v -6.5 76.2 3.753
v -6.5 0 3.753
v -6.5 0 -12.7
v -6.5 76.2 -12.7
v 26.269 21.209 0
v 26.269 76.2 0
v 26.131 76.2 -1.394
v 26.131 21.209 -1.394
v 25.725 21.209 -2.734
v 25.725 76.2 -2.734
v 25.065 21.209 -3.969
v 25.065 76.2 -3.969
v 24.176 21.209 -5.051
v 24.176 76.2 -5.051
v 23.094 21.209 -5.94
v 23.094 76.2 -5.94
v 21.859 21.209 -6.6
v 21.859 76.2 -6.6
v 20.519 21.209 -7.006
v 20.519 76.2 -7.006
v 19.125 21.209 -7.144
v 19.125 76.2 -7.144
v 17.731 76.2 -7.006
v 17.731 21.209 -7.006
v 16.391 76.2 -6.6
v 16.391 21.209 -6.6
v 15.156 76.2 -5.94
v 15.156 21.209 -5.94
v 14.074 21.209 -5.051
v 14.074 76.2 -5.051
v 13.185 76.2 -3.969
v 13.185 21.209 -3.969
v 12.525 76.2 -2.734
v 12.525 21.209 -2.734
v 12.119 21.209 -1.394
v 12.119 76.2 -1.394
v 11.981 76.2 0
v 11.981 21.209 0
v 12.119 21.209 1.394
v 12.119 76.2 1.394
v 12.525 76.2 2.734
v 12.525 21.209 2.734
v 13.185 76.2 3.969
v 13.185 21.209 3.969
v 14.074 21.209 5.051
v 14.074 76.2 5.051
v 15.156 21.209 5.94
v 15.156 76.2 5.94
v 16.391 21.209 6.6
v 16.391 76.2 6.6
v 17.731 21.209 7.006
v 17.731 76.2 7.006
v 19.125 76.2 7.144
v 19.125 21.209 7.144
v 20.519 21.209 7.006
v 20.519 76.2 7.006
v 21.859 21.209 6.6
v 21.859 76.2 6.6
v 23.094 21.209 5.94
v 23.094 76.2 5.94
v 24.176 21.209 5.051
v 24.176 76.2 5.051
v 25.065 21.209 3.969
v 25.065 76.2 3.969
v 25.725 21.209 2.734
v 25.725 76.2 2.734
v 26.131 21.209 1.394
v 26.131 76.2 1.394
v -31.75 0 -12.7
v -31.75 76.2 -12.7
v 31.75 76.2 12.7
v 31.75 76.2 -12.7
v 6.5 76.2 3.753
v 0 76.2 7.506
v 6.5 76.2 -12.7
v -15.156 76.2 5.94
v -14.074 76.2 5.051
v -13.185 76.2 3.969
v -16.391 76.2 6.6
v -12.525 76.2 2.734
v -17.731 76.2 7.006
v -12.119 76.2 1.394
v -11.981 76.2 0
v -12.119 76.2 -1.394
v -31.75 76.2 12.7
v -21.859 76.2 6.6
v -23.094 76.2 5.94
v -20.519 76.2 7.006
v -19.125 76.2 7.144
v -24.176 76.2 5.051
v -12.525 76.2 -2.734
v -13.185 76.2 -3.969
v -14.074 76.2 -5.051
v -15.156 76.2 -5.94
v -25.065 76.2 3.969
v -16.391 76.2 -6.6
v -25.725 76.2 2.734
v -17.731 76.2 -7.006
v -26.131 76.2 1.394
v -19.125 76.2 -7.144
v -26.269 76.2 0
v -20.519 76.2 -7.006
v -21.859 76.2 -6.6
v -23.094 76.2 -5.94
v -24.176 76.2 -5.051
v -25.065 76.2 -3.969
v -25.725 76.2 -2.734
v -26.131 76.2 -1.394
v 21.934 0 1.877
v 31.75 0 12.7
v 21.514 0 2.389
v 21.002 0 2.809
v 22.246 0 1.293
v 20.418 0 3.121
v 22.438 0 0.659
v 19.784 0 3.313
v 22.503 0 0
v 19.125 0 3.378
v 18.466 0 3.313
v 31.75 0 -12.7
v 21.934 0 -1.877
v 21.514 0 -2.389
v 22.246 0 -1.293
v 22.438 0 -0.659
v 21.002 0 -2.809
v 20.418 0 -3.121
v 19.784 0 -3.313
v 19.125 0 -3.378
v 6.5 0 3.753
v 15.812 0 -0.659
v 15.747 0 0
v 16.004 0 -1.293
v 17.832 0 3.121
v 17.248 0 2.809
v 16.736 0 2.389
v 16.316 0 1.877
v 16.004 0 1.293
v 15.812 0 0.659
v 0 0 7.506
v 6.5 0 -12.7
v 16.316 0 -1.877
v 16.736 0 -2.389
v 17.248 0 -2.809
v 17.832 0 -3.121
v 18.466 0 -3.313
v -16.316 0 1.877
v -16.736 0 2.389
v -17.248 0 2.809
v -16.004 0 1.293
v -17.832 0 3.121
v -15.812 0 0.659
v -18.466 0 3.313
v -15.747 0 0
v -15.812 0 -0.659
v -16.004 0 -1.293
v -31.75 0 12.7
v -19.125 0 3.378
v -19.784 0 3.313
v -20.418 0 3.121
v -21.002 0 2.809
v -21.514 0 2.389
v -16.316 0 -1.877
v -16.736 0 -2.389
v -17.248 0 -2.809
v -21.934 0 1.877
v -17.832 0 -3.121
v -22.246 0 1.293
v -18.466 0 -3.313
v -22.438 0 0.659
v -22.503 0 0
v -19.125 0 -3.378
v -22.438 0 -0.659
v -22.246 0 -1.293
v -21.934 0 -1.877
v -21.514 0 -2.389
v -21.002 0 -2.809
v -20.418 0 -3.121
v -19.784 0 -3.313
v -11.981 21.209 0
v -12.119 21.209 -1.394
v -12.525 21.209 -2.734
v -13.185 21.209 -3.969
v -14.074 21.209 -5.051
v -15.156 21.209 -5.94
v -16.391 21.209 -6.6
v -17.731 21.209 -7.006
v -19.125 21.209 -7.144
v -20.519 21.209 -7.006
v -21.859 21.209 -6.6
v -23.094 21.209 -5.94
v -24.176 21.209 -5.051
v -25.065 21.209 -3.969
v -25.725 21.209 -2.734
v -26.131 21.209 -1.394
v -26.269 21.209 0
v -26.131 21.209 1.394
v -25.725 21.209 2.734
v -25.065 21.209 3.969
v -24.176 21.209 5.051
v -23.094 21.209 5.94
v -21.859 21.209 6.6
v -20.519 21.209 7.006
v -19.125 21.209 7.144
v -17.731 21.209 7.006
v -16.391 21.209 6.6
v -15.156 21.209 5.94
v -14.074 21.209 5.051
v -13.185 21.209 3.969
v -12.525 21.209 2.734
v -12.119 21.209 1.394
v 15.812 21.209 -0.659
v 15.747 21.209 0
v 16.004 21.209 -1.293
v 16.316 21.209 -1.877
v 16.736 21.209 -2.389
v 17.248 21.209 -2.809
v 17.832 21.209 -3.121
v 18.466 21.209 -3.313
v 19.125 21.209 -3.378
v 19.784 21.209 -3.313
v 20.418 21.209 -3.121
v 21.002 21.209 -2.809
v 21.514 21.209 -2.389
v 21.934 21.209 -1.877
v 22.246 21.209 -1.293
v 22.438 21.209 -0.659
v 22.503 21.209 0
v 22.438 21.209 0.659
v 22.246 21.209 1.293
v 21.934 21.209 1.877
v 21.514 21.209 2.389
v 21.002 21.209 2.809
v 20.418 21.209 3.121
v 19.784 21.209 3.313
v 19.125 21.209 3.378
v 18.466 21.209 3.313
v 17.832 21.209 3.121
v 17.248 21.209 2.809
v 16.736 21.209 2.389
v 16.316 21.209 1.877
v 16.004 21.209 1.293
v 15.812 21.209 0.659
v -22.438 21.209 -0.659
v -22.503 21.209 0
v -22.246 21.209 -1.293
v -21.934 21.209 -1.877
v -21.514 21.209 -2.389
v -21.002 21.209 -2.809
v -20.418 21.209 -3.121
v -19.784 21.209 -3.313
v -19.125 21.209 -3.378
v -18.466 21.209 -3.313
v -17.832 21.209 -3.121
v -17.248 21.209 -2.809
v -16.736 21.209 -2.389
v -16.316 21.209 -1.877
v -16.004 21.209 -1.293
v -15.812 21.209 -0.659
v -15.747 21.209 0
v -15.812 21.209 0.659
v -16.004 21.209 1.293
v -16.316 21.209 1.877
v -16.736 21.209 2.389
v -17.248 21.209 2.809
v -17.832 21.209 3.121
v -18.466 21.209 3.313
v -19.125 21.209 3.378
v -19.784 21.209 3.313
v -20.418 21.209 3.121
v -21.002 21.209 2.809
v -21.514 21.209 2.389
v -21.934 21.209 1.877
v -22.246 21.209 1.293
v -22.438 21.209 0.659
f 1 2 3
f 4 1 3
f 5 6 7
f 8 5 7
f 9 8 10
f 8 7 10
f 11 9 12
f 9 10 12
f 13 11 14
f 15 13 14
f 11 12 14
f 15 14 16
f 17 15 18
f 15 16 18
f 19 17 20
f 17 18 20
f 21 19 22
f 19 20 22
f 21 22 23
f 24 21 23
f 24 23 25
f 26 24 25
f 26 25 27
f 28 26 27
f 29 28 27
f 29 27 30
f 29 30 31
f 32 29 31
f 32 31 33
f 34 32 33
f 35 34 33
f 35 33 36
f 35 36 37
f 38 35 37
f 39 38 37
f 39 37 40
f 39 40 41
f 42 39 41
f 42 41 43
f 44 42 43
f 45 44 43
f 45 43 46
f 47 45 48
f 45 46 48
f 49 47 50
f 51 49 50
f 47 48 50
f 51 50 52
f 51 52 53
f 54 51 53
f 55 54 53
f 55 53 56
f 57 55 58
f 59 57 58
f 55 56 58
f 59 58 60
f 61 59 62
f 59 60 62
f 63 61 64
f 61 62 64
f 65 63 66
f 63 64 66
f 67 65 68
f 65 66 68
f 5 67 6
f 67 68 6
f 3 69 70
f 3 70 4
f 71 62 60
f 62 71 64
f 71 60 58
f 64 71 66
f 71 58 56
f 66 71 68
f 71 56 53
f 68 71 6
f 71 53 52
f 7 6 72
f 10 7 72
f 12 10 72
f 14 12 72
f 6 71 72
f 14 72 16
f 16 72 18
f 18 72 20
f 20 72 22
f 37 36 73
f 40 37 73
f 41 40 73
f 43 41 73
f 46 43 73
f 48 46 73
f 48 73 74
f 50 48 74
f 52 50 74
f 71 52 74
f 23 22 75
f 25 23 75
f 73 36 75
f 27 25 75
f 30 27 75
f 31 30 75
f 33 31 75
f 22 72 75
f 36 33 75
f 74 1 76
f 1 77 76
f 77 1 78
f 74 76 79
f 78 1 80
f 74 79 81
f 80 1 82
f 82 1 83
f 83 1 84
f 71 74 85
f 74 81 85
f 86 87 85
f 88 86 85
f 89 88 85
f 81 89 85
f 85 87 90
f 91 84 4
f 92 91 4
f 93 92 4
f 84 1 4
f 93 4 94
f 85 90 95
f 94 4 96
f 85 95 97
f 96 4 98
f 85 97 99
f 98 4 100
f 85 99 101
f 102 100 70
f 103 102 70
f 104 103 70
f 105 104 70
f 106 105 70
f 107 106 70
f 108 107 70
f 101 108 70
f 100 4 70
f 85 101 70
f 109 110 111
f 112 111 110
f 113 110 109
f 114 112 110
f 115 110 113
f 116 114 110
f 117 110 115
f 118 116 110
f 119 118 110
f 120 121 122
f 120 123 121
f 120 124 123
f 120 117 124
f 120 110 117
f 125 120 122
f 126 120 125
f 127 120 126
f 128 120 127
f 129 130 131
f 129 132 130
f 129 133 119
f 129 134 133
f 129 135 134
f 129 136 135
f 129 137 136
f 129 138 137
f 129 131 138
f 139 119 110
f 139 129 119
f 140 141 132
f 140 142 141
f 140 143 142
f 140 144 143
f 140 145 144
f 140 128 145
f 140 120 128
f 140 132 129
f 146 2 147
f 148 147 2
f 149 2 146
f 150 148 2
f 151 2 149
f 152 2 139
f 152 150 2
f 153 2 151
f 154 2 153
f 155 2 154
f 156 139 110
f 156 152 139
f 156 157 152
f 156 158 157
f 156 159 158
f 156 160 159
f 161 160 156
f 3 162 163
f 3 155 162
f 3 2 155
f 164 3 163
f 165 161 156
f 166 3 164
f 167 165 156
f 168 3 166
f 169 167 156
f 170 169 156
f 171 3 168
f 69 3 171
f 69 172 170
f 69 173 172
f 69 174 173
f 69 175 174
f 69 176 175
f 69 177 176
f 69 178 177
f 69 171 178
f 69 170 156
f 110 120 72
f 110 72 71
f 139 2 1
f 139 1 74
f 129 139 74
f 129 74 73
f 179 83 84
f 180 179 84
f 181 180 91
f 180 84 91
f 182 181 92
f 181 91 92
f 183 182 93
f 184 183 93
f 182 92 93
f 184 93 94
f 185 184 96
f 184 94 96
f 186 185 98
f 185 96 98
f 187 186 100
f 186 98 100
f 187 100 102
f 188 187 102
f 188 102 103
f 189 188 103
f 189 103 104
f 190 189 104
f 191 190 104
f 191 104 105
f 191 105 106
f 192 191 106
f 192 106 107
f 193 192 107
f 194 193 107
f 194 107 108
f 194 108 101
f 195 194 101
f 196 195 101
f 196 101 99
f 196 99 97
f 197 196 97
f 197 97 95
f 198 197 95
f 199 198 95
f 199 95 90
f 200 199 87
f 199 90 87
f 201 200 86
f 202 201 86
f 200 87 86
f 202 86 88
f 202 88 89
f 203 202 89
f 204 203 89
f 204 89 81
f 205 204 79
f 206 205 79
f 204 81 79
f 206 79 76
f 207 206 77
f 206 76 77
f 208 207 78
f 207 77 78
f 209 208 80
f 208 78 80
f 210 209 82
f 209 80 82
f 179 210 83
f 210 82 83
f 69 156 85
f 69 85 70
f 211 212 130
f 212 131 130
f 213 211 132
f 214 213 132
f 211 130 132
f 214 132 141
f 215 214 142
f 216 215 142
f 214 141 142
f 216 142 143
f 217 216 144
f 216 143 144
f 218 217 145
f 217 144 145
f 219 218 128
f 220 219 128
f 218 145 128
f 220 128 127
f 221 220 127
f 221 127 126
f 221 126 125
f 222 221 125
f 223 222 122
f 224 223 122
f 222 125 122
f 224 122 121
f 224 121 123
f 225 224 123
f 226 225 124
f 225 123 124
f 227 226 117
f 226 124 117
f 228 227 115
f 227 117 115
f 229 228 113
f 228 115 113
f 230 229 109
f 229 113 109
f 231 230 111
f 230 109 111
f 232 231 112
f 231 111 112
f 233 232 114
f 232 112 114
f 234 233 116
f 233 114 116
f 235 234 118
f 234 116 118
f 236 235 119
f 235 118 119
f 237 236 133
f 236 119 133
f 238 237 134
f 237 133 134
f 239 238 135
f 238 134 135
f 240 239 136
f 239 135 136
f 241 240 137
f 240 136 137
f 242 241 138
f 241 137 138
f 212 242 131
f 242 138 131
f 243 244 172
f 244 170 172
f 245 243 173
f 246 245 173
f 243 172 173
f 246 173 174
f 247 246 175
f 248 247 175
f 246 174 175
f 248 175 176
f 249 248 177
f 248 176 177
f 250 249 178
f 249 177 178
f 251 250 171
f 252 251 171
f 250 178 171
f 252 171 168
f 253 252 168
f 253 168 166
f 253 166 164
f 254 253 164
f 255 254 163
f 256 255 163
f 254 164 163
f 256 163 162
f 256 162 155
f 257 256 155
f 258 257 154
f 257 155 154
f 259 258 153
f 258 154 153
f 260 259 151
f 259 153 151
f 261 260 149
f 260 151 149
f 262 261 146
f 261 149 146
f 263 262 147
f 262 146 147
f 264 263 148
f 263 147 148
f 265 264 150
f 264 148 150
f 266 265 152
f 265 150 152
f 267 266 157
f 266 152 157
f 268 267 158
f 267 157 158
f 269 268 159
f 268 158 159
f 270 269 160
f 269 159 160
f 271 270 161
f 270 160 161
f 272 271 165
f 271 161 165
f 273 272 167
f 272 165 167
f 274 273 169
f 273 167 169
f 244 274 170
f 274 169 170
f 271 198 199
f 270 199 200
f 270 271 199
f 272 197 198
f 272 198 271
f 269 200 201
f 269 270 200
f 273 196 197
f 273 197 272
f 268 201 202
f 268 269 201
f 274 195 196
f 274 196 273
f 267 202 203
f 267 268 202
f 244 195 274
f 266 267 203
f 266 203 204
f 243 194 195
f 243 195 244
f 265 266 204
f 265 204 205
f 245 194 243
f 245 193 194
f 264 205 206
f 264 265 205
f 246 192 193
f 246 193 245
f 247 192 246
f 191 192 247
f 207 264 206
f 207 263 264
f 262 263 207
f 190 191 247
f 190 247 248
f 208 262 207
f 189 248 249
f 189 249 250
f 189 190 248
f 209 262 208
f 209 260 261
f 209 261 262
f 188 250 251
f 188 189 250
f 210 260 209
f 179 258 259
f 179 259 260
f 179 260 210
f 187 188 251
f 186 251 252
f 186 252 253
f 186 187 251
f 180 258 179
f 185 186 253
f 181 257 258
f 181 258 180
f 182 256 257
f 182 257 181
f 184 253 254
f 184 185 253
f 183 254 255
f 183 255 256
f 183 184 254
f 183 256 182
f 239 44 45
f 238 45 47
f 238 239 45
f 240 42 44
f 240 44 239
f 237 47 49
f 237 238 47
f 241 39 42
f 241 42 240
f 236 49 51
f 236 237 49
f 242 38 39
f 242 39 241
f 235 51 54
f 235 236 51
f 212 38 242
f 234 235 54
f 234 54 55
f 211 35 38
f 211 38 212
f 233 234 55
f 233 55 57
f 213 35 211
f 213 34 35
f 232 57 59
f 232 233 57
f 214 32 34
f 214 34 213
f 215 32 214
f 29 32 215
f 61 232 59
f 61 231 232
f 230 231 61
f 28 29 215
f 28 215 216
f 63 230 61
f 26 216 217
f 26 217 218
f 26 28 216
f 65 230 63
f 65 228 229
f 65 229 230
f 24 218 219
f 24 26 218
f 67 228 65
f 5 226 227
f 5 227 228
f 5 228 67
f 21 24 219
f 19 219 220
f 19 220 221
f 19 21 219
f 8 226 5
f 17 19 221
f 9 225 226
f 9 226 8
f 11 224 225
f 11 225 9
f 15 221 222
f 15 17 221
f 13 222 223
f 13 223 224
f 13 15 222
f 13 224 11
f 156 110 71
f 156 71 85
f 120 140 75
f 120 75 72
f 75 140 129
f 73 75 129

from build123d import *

# Parameters (mm, degrees)
BOSS_EXTRUDE1_DEPTH                                  = 76.2
CBORE_FOR_1_4_BINDING_HEAD_MACHINE_SCREW_D           = 6.7564
CBORE_FOR_1_4_BINDING_HEAD_MACHINE_SCREW_CBORE_D     = 14.2875
CBORE_FOR_1_4_BINDING_HEAD_MACHINE_SCREW_CBORE_DEPTH = 54.991


with BuildPart() as part:
    # Sketch1 → Boss-Extrude1 (new body)
    with BuildSketch(Plane(origin=(0, 0, 0), x_dir=(1, 0, 0), z_dir=(0, 1, 0))):
        Polygon((0, -7.505553499), (6.5, -3.75277675), (6.5, 3.75277675), (6.5, 12.7), (31.75, 12.7), (31.75, -12.7), (-31.75, -12.7), (-31.75, 12.7), (-6.5, 12.7), (-6.5, 3.75277675), (-6.5, -3.75277675), align=None)
    extrude(amount=BOSS_EXTRUDE1_DEPTH)

    # CBORE for 1/4 Binding Head Machine Screw1 (through all)
    with Locations(Plane(origin=(0, 76.2, 0), x_dir=(1, 0, 0), z_dir=(0, 1, 0))):
        with Locations((-19.125, 0), (19.125, 0)):
            CounterBoreHole(CBORE_FOR_1_4_BINDING_HEAD_MACHINE_SCREW_D / 2, CBORE_FOR_1_4_BINDING_HEAD_MACHINE_SCREW_CBORE_D / 2, CBORE_FOR_1_4_BINDING_HEAD_MACHINE_SCREW_CBORE_DEPTH)


solid = part.part
